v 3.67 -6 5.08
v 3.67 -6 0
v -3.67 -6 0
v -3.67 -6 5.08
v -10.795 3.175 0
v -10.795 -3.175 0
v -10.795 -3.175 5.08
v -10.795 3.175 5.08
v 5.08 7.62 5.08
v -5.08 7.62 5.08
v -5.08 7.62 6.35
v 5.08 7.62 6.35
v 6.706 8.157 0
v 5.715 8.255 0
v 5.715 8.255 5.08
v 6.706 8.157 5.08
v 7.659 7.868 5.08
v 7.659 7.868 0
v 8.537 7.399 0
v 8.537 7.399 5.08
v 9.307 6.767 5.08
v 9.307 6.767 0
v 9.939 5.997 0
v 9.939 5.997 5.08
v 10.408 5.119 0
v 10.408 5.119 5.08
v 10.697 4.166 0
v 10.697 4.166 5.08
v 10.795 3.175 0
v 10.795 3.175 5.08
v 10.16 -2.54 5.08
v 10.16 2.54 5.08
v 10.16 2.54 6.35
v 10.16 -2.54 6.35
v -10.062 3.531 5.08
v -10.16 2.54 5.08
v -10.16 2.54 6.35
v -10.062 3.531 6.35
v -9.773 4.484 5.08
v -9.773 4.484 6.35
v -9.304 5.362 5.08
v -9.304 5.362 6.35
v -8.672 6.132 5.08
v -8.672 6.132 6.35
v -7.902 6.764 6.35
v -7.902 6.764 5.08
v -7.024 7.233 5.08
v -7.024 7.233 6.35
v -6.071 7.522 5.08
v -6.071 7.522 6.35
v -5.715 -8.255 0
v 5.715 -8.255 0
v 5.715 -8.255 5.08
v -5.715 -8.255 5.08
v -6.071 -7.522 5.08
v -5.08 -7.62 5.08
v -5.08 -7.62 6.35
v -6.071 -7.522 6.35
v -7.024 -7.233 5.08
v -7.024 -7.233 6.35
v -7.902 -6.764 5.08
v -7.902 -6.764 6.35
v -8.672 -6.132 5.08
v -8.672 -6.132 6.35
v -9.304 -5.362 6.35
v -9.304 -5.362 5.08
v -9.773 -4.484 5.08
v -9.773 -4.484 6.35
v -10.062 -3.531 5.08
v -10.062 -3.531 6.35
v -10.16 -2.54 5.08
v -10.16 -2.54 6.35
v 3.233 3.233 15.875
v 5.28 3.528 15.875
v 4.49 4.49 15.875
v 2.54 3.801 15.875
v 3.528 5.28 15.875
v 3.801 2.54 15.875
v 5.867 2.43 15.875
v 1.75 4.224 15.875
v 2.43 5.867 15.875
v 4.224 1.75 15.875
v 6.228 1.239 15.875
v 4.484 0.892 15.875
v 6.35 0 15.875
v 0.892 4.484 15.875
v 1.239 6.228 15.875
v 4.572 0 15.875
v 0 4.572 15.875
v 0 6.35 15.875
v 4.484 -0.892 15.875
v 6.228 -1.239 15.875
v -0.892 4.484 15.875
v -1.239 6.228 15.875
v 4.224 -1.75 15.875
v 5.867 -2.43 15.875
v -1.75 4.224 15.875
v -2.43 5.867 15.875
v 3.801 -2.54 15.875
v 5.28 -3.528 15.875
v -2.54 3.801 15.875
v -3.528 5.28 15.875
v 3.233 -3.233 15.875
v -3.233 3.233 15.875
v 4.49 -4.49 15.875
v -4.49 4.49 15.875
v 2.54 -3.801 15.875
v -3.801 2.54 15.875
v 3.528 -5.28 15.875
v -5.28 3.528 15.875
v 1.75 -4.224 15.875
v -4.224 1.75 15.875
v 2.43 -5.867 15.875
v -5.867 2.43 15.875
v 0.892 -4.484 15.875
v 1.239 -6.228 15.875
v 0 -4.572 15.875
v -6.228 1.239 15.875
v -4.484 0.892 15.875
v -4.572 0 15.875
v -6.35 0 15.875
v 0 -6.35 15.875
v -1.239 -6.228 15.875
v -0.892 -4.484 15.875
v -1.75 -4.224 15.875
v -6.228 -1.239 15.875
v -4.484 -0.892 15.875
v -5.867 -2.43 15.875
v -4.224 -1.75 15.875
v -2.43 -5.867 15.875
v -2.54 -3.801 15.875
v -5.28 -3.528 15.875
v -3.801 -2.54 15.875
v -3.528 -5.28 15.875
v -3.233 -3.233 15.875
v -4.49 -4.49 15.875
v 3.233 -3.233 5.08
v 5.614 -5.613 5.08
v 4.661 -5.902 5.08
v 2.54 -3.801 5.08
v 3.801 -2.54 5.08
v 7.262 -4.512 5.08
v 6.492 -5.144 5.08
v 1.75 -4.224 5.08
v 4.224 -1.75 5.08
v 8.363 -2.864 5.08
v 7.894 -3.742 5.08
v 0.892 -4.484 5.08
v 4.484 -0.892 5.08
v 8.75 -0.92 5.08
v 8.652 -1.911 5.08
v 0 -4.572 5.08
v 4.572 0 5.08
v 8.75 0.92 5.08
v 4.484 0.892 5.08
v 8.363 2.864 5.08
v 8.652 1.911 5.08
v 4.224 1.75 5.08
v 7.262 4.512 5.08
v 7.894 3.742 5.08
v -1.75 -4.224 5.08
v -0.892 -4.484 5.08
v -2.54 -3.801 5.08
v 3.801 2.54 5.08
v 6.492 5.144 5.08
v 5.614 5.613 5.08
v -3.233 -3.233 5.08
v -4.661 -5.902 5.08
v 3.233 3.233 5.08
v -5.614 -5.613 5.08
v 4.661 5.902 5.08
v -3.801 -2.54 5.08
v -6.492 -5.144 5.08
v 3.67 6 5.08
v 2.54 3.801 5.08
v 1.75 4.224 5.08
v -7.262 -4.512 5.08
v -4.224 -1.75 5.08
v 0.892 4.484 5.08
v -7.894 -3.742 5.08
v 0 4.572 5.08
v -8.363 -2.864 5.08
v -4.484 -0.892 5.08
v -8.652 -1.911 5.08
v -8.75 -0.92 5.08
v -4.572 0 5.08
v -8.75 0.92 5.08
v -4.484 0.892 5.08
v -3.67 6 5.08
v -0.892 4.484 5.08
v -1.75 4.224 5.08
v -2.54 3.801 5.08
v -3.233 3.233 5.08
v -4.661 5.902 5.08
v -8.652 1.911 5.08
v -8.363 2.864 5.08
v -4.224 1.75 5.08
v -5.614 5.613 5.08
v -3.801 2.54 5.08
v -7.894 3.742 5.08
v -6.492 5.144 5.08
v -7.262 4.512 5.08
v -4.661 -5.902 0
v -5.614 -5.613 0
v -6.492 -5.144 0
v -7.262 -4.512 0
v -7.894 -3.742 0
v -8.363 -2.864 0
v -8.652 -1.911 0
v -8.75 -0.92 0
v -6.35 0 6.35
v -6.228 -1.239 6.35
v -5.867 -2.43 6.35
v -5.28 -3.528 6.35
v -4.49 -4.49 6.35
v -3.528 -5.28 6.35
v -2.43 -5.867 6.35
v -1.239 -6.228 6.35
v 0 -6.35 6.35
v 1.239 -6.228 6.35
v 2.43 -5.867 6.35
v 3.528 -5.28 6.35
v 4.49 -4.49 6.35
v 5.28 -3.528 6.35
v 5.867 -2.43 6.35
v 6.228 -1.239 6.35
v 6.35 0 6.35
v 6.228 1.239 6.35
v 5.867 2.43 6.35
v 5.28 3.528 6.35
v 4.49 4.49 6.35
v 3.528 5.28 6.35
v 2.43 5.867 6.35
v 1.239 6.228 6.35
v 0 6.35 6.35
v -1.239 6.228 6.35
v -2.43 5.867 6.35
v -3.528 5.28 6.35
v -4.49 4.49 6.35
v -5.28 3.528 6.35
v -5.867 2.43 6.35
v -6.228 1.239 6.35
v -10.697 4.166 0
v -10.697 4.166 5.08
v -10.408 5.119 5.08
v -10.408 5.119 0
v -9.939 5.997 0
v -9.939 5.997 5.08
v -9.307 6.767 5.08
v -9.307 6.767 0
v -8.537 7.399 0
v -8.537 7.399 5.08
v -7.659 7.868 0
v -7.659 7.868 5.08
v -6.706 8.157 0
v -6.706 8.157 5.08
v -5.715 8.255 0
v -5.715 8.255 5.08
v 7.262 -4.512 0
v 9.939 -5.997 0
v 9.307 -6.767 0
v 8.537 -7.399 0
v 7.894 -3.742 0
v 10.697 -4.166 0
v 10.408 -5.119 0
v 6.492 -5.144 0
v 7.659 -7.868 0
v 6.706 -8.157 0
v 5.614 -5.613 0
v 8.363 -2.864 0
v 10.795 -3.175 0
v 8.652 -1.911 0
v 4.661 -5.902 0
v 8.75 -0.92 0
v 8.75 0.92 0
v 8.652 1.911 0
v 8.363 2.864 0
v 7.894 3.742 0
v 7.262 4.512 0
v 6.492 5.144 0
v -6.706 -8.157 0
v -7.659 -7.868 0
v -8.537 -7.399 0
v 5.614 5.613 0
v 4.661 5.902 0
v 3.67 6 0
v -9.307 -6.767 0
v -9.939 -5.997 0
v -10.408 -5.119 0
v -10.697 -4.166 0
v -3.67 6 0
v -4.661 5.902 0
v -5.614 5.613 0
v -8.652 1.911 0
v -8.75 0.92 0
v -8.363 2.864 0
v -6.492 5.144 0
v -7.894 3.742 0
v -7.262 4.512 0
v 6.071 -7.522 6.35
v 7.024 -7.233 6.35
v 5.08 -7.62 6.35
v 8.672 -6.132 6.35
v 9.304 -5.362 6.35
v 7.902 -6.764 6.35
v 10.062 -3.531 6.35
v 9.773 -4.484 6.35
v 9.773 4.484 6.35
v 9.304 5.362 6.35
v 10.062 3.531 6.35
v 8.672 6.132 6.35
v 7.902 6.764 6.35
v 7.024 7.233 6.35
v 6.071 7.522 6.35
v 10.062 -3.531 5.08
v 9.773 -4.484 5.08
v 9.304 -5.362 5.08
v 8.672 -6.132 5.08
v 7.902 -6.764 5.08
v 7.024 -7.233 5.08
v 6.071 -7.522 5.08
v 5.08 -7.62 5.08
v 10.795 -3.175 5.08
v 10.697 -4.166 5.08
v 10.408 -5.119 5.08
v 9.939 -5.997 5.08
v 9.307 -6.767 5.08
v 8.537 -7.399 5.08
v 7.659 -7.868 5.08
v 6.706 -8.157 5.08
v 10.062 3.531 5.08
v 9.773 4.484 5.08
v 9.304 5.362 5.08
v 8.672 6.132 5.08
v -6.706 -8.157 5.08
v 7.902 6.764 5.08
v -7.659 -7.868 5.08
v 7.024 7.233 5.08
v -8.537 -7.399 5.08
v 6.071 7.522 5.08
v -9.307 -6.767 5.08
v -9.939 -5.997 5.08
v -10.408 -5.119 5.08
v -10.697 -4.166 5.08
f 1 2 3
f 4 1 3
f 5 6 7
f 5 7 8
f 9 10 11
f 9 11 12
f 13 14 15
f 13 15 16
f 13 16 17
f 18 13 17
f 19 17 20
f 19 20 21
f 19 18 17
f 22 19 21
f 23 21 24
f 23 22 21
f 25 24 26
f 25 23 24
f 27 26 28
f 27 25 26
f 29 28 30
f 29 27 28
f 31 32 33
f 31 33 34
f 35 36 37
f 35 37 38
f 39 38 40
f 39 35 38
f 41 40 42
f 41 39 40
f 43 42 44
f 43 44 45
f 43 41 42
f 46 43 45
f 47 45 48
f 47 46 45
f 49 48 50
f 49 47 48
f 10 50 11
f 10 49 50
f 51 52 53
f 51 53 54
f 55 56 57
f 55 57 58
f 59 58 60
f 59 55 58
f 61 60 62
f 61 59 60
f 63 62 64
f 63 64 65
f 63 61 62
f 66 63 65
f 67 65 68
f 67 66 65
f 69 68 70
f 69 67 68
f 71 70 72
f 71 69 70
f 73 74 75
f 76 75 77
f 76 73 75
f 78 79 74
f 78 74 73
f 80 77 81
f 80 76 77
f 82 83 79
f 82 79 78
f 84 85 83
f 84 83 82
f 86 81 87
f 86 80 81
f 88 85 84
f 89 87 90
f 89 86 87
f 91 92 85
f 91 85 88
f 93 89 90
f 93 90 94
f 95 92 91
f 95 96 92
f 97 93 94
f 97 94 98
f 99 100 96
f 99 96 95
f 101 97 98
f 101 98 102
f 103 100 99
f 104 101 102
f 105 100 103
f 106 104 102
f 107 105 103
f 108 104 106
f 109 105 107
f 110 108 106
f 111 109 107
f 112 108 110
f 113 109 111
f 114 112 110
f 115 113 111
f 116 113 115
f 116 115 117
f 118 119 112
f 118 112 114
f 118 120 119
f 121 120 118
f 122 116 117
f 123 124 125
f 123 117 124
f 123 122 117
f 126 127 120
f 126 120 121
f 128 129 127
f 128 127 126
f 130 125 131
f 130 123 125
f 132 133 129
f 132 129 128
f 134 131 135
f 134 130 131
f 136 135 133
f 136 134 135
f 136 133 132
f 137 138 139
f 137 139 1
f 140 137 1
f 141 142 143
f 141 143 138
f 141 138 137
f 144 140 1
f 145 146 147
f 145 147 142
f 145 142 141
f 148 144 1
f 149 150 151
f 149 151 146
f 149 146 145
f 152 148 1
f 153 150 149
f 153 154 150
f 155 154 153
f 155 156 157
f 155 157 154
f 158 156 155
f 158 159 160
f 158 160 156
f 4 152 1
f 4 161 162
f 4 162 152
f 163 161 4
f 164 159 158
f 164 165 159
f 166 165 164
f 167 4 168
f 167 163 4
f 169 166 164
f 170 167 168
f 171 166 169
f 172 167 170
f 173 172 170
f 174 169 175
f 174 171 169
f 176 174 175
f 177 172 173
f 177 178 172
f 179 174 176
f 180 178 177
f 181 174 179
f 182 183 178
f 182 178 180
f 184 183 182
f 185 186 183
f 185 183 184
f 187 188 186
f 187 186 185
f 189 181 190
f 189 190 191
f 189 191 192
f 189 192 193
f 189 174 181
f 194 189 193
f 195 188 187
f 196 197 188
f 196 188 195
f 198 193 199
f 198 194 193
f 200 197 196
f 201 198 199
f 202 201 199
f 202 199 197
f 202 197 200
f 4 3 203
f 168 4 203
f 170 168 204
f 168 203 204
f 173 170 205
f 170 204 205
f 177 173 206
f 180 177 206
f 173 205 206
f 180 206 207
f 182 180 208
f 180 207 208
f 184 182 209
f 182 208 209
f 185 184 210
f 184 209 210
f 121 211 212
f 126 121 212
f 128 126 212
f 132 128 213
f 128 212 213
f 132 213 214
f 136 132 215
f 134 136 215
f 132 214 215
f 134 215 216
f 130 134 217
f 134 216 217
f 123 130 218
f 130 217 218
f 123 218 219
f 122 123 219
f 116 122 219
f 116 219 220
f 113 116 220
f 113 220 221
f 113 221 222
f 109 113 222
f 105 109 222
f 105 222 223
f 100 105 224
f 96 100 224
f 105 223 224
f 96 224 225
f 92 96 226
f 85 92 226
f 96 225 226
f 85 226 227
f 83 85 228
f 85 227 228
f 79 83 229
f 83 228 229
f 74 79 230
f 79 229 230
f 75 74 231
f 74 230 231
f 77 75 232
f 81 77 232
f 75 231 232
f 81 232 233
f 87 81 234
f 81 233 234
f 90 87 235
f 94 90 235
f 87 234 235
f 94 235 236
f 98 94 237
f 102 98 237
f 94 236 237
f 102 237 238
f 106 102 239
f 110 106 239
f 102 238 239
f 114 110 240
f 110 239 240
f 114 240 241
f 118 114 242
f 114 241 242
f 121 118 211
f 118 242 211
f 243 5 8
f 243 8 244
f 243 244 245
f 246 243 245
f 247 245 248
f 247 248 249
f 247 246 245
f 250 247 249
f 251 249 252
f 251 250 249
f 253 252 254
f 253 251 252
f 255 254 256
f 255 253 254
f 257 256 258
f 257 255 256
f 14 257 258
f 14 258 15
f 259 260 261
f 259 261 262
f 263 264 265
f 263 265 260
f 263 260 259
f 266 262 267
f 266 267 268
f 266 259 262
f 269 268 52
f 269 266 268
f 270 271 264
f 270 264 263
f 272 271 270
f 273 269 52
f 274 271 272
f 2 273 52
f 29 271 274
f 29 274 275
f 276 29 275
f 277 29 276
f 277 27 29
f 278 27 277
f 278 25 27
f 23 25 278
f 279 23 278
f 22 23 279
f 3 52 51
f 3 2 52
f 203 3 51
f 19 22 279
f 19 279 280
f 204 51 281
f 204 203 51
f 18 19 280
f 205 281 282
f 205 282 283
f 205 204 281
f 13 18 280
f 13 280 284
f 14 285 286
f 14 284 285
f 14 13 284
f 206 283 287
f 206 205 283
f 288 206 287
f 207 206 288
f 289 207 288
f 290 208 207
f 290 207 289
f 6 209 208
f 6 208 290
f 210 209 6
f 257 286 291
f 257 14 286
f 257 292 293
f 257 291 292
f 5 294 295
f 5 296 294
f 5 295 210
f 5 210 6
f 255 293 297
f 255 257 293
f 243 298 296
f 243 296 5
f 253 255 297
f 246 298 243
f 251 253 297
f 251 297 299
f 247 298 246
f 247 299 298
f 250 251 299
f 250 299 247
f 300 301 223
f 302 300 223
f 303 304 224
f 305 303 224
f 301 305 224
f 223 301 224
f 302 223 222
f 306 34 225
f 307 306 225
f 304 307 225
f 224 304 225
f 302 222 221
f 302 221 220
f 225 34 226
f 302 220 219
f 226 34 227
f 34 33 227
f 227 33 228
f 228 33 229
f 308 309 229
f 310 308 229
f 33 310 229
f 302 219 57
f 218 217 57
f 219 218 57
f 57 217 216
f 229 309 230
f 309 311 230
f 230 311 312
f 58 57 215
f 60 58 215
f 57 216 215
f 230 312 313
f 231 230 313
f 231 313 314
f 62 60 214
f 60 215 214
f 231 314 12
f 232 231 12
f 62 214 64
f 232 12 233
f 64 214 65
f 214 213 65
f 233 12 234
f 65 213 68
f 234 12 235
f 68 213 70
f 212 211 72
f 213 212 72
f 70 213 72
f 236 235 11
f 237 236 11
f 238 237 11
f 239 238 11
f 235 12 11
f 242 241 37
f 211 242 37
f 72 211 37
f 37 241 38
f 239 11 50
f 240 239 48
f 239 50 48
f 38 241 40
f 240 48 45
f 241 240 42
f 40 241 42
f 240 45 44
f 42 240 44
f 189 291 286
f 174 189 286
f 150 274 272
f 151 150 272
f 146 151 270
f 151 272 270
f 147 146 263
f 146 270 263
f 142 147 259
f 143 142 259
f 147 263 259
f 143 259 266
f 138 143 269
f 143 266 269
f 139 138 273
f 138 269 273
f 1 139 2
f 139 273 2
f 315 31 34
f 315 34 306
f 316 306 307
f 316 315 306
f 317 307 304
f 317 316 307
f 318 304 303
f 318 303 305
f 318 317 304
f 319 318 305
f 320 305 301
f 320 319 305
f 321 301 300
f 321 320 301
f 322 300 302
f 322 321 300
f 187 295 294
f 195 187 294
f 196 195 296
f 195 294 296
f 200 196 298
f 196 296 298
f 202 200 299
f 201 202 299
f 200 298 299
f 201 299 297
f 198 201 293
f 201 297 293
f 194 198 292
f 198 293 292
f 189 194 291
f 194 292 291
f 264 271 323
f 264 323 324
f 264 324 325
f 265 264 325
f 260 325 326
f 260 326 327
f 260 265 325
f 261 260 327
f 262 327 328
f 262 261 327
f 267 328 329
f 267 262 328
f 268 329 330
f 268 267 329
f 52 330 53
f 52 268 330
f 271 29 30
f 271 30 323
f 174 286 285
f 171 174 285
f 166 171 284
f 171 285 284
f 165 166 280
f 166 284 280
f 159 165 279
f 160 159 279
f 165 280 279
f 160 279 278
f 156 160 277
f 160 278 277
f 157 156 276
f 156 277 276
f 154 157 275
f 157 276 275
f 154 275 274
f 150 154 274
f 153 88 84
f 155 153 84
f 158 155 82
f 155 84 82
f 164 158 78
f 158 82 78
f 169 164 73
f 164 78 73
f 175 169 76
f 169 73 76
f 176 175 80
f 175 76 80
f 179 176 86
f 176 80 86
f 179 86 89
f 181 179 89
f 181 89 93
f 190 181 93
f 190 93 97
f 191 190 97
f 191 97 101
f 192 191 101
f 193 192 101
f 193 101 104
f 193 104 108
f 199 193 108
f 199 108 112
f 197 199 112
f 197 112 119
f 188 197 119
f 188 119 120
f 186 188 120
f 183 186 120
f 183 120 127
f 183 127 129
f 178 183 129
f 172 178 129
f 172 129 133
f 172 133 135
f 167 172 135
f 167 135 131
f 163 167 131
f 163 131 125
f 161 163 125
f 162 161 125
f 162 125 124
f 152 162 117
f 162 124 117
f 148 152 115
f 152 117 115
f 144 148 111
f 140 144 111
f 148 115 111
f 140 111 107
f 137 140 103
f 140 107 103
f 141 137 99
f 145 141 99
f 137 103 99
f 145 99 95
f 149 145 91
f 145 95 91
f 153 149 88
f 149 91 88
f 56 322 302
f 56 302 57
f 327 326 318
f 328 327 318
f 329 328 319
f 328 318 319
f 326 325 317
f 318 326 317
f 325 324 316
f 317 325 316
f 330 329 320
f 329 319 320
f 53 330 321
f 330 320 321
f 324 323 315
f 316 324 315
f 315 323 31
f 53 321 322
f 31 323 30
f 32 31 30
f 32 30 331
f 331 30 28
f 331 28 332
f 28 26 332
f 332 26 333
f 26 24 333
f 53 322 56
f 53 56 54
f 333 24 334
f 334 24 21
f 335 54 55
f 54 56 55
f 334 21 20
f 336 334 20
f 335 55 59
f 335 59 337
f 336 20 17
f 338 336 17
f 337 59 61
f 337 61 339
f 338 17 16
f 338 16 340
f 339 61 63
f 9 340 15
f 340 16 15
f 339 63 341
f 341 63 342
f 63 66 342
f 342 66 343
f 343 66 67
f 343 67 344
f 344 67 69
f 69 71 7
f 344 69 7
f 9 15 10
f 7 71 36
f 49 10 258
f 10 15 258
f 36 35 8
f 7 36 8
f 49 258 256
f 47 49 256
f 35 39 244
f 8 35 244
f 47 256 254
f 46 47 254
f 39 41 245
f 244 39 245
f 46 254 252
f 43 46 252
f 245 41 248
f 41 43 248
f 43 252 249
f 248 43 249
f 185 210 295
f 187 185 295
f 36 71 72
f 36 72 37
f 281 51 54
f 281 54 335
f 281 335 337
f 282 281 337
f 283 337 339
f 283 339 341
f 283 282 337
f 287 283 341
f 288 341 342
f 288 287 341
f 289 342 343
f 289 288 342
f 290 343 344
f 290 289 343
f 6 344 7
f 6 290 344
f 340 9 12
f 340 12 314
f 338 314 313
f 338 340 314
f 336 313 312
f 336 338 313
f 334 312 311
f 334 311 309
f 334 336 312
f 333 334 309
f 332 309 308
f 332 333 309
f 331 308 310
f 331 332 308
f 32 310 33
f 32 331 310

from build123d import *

# Parameters (mm, degrees)
BOSS_EXTRUDE1_DEPTH = 5.08
BOSS_EXTRUDE2_DEPTH = 1.27
SKETCH4_R           = 6.35
BOSS_EXTRUDE3_DEPTH = 9.525
SKETCH5_R           = 4.572
CUT_EXTRUDE1_DEPTH  = 12.7


with BuildPart() as part:
    # Sketch1 → Boss-Extrude1 (new body)
    with BuildSketch(Plane.XY):
        with BuildLine():
            Line((5.715, -8.255), (-5.715, -8.255))
            ThreePointArc((-5.715, -8.255), (-9.307102448, -6.767102448), (-10.795, -3.175))
            Line((-10.795, -3.175), (-10.795, 3.175))
            ThreePointArc((-10.795, 3.175), (-9.307102448, 6.767102448), (-5.715, 8.255))
            Line((-5.715, 8.255), (5.715, 8.255))
            ThreePointArc((5.715, 8.255), (9.307102448, 6.767102448), (10.795, 3.175))
            Line((10.795, 3.175), (10.795, -3.175))
            ThreePointArc((10.795, -3.175), (9.307102448, -6.767102448), (5.715, -8.255))
        make_face()
        with BuildLine():
            Line((3.67, -6), (-3.67, -6))
            ThreePointArc((-3.67, -6), (-7.262102448, -4.512102448), (-8.75, -0.92))
            Line((-8.75, -0.92), (-8.75, 0.92))
            ThreePointArc((-8.75, 0.92), (-7.262102448, 4.512102448), (-3.67, 6))
            Line((-3.67, 6), (3.67, 6))
            ThreePointArc((3.67, 6), (7.262102448, 4.512102448), (8.75, 0.92))
            Line((8.75, 0.92), (8.75, -0.92))
            ThreePointArc((8.75, -0.92), (7.262102448, -4.512102448), (3.67, -6))
        make_face(mode=Mode.SUBTRACT)
    extrude(amount=BOSS_EXTRUDE1_DEPTH)

    # Sketch2 → Boss-Extrude2 (add)
    with BuildSketch(Plane.XY.offset(5.08)):
        with BuildLine():
            Line((5.08, -7.62), (-5.08, -7.62))
            ThreePointArc((-5.08, -7.62), (-8.672102448, -6.132102448), (-10.16, -2.54))
            Line((-10.16, -2.54), (-10.16, 2.54))
            ThreePointArc((-10.16, 2.54), (-8.672102448, 6.132102448), (-5.08, 7.62))
            Line((-5.08, 7.62), (5.08, 7.62))
            ThreePointArc((5.08, 7.62), (8.672102448, 6.132102448), (10.16, 2.54))
            Line((10.16, 2.54), (10.16, -2.54))
            ThreePointArc((10.16, -2.54), (8.672102448, -6.132102448), (5.08, -7.62))
        make_face()
    extrude(amount=BOSS_EXTRUDE2_DEPTH)

    # Sketch4 → Boss-Extrude3 (add)
    with BuildSketch(Plane.XY.offset(6.35)):
        with Locations(Location((0, 0, 0), (0, 0, 180))):
            Circle(SKETCH4_R)
    extrude(amount=BOSS_EXTRUDE3_DEPTH)

    # Sketch5 → Cut-Extrude1 (cut)
    with BuildSketch(Plane.XY.offset(15.875)):
        Circle(SKETCH5_R)
    extrude(amount=-CUT_EXTRUDE1_DEPTH, mode=Mode.SUBTRACT)


solid = part.part
